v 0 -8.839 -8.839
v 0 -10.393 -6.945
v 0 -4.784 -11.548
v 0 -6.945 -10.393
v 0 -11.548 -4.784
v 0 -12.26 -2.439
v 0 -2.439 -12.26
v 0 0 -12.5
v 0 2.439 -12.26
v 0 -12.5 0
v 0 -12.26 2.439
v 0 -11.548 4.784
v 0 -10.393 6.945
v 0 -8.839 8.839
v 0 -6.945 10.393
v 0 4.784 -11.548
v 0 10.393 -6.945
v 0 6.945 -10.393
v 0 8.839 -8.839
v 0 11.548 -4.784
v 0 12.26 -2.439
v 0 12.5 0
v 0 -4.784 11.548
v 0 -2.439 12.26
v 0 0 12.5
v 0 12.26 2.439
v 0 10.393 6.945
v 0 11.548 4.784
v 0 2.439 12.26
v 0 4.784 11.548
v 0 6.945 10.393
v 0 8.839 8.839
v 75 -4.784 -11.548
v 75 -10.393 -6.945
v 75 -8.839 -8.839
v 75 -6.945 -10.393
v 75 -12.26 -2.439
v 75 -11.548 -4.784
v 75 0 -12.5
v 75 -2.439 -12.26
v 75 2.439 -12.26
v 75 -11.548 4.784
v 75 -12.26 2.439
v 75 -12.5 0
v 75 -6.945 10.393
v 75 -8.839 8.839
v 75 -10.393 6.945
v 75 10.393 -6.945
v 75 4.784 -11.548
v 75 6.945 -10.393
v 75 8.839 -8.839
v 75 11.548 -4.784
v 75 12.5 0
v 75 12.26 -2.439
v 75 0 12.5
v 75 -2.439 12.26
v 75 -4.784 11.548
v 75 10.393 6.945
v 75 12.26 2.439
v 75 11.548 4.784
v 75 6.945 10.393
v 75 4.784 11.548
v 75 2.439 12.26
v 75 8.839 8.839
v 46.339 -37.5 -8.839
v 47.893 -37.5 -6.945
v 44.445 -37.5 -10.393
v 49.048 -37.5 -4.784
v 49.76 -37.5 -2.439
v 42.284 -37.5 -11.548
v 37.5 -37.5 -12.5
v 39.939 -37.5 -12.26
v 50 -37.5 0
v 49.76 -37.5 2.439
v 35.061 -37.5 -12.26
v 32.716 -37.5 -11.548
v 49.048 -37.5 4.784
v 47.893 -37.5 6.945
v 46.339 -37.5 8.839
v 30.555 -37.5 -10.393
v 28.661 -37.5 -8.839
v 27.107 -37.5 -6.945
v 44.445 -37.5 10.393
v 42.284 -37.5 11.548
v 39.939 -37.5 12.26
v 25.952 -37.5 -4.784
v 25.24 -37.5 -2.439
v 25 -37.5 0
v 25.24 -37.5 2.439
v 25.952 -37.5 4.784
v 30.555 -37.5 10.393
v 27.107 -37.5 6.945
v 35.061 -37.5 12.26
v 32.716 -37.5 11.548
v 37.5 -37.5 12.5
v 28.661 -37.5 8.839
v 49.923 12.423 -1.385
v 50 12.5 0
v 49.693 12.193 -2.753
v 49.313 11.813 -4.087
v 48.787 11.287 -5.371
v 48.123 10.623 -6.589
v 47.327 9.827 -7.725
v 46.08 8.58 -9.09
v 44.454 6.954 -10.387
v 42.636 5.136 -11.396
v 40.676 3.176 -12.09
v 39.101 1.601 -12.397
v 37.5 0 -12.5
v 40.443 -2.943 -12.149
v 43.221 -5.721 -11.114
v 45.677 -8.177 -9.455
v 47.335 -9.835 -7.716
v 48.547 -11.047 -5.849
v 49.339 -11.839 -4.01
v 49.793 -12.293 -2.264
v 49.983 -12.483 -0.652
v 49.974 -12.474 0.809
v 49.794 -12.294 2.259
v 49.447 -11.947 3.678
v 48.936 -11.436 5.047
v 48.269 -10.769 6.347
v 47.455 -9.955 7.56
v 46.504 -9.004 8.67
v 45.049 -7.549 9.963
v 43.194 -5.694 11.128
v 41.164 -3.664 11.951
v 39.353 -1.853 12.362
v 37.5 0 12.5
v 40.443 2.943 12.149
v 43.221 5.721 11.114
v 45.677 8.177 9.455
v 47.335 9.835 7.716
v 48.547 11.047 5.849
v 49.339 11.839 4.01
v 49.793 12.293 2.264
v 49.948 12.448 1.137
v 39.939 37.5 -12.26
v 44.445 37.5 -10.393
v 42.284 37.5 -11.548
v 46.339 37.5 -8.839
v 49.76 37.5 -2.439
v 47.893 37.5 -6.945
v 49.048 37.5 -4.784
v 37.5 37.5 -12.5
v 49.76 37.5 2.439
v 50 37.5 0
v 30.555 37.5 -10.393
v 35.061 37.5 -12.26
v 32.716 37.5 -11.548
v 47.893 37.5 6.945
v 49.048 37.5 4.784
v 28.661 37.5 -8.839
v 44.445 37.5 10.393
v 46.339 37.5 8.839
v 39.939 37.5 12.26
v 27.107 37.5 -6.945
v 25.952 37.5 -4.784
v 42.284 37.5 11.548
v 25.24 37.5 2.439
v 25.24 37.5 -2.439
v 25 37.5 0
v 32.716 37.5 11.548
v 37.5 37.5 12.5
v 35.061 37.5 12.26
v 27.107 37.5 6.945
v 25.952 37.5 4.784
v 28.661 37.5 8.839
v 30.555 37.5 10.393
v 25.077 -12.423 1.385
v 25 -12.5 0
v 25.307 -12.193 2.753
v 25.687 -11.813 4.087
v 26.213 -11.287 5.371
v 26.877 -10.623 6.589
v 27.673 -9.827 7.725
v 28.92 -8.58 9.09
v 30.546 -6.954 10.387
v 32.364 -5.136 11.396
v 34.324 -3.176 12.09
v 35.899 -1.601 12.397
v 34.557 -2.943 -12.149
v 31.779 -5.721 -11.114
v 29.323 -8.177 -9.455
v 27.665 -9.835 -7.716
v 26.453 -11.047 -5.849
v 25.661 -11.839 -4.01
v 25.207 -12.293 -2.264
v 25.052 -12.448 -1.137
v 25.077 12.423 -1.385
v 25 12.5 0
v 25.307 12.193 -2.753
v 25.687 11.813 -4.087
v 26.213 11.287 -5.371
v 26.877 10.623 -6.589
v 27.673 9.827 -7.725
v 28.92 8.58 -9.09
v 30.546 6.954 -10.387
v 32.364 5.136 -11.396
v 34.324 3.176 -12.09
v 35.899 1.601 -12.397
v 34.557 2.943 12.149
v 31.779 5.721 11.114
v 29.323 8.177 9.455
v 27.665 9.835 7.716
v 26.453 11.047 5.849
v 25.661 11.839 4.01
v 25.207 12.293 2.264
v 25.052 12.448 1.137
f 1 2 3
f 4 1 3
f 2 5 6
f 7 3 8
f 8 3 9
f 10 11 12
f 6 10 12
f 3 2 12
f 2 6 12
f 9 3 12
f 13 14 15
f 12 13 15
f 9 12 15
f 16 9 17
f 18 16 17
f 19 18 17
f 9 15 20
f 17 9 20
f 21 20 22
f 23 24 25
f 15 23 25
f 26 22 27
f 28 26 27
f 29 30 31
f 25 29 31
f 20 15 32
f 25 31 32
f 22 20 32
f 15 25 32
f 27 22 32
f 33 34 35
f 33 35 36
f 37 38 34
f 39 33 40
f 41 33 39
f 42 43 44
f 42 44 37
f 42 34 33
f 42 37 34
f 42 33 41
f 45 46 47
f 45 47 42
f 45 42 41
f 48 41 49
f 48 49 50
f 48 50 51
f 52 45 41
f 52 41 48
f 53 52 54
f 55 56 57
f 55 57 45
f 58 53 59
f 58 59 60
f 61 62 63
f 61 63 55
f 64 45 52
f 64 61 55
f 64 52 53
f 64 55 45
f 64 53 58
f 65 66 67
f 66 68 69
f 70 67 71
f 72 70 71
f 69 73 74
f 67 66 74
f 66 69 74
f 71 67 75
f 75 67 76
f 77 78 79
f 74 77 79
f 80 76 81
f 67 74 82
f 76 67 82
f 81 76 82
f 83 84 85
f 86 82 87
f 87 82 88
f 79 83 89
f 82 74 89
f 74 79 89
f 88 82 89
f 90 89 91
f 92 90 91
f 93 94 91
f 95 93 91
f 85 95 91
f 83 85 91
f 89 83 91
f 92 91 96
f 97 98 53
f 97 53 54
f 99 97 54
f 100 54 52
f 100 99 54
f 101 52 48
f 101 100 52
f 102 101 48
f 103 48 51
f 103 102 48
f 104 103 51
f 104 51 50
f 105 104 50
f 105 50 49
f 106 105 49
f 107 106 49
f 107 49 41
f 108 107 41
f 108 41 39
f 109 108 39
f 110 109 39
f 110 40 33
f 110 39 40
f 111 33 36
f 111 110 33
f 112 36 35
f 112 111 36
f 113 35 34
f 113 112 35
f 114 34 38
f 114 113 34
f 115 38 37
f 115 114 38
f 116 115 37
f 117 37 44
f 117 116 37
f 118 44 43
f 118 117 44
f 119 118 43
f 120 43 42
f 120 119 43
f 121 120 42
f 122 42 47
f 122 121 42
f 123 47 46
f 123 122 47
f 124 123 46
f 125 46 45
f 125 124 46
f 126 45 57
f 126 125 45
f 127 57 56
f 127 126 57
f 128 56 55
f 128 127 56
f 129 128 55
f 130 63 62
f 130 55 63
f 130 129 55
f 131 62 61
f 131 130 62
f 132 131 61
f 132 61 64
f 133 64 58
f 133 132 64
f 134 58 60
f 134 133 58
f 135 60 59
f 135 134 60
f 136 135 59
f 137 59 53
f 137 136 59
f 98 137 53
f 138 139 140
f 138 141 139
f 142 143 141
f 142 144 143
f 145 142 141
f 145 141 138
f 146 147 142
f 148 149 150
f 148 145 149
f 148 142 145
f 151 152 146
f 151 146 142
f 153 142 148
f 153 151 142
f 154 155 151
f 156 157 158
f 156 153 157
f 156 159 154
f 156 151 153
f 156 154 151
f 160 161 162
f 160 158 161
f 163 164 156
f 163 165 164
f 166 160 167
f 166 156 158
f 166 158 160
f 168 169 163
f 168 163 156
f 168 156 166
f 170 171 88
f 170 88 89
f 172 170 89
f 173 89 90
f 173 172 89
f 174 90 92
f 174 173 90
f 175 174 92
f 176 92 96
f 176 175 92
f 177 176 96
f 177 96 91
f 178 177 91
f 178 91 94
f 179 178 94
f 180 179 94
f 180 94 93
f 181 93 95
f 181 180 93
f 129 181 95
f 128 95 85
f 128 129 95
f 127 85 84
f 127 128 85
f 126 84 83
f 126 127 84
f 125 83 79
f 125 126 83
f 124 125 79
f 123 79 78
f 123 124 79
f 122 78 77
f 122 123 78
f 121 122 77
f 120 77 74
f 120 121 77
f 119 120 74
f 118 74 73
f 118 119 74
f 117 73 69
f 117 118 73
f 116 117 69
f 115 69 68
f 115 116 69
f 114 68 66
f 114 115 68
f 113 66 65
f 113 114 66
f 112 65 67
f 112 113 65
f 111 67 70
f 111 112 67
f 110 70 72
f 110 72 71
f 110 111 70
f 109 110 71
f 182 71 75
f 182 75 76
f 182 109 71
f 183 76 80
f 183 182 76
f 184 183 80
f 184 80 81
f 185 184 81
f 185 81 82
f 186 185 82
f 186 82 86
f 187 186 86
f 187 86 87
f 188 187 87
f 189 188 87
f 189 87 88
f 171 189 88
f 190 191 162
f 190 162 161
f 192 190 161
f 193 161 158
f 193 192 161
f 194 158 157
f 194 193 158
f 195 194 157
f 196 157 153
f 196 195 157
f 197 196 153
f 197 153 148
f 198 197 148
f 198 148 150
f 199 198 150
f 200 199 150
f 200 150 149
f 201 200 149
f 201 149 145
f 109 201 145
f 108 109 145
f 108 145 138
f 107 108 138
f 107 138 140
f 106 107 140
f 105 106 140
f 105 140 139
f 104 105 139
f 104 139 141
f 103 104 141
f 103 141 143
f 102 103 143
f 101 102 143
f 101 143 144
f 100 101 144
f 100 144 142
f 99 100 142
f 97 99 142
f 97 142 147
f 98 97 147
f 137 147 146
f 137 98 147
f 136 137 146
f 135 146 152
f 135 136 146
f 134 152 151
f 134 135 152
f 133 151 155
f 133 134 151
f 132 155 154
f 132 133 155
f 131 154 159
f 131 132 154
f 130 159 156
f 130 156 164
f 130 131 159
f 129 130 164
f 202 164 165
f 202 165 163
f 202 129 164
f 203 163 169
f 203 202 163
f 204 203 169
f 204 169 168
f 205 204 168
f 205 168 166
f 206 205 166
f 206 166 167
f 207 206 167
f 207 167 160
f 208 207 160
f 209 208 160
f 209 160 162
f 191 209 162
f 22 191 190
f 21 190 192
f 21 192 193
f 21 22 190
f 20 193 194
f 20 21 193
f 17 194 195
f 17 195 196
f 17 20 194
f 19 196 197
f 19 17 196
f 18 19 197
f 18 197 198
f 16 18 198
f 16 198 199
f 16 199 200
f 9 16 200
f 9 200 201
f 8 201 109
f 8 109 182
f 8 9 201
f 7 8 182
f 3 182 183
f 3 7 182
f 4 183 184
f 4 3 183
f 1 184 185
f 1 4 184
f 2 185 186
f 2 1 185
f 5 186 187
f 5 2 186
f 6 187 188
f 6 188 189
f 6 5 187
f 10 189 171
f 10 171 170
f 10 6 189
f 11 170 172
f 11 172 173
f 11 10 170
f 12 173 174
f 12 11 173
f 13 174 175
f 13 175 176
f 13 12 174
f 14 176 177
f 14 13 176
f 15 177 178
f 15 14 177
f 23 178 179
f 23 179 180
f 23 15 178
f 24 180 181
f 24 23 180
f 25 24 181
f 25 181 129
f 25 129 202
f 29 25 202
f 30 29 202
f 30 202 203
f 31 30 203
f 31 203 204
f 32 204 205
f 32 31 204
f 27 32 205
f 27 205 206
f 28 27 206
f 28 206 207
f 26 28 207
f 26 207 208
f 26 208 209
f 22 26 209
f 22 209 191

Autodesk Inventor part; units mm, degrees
ref_plane "YZ Plane" through (0, 0, 0) normal (1, 0, 0) x (0, 1, 0)
ref_plane "XZ Plane" through (0, 0, 0) normal (0, 1, 0) x (-1, 0, 0)
ref_plane "XY Plane" through (0, 0, 0) normal (0, 0, 1) x (1, 0, 0)
sketch "草图1" plane through (0, 0, 0) normal (1, 0, 0) x (0, 1, 0)
  circle A0 centre (0, 0) radius 12.5
  dimension "d0" = 25
extrude "拉伸1" add sketch "草图1" along normal blind 75
sketch "草图2" plane through (0, 0, 0) normal (0, 1, 0) x (-1, 0, 0)
  circle A0 centre (-37.5, 0) radius 12.5
  line L0 (0, 12.5) -> (-75, 12.5) projected
  line L1 (0, -12.5) -> (-75, -12.5) projected
  point P0 (0, 0)
  point P1 (-37.5, -12.5)
extrude "拉伸2" add sketch "草图2" along normal mid plane 75
properties part number "第一次上机-示例建模"
